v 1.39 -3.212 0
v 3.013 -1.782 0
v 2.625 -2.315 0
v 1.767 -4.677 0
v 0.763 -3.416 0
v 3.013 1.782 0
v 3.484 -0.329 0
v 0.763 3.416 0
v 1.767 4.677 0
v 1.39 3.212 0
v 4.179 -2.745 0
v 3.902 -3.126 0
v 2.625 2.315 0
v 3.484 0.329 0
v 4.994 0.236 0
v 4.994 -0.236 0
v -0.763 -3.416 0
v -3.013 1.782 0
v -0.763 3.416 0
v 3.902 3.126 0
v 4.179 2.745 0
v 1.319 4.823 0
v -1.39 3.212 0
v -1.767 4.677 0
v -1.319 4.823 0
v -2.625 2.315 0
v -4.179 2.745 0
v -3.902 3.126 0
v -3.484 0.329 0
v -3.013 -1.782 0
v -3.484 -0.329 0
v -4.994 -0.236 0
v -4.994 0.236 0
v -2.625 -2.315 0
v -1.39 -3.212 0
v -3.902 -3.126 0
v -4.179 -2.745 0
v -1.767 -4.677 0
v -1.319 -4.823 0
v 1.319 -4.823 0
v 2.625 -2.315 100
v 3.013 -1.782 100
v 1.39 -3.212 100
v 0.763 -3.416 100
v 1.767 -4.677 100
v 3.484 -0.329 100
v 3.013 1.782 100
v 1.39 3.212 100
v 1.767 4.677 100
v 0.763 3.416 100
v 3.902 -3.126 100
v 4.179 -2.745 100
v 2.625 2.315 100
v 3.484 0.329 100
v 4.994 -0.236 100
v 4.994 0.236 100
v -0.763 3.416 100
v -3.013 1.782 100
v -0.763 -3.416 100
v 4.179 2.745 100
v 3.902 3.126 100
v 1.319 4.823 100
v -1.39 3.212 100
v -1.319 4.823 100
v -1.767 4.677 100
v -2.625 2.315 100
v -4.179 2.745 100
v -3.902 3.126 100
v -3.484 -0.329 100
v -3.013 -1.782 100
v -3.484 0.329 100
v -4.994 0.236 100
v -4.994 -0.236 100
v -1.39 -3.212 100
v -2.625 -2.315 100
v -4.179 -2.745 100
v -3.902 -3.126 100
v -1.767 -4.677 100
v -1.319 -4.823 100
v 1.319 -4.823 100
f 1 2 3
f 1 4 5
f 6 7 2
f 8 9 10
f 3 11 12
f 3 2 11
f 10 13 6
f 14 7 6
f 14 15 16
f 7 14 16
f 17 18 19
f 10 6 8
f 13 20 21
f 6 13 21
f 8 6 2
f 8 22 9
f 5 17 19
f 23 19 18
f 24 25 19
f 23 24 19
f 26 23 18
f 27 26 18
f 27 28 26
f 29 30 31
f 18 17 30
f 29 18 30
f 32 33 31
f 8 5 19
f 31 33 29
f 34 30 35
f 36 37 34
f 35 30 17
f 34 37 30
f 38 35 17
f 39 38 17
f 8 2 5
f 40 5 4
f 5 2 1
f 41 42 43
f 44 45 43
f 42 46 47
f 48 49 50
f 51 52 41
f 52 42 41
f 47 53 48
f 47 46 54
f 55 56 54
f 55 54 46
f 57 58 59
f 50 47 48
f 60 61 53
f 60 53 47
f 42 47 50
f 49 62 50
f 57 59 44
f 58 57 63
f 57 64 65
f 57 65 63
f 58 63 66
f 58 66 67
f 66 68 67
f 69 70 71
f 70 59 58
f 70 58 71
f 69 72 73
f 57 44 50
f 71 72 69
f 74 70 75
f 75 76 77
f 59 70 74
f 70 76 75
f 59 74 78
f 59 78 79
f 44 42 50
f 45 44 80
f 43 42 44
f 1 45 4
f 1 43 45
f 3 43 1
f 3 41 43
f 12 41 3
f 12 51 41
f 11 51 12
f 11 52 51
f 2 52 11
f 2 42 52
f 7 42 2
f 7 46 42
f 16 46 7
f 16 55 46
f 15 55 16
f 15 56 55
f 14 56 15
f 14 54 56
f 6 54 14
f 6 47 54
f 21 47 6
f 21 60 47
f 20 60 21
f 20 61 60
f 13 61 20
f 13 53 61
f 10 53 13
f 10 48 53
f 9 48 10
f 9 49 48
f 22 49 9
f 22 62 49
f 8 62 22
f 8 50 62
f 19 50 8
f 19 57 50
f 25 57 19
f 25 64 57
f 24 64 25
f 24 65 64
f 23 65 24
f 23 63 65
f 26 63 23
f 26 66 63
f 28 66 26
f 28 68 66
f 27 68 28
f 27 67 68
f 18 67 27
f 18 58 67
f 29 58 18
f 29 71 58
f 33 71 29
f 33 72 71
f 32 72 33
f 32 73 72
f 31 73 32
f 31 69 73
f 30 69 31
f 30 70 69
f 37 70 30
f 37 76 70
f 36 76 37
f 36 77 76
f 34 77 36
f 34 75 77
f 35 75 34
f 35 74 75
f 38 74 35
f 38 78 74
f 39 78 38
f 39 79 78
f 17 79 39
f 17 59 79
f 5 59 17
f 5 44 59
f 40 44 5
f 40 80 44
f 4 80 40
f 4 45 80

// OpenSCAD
// --- Parameters ---
rod_height = 100;      // How tall the rod is
number_of_teeth = 10;  // Fewer teeth = smaller diameter
outer_radius = 5;      // Distance from center to tooth tip
inner_radius = 3.5;    // Distance from center to tooth valley
tooth_width = 0.6;     // Sharpness of the teeth (0.1 to 1.0)

// --- The Logic ---
linear_extrude(height = rod_height, convexity = 10) {
    gear_profile(number_of_teeth, outer_radius, inner_radius, tooth_width);
}

// Module to create the 2D gear shape
module gear_profile(teeth, r_out, r_in, flat) {
    angle_step = 360 / teeth;
    
    points = [
        for (i = [0 : teeth - 1]) 
            each [
                // Inner point (start of tooth)
                [r_in * cos(i * angle_step - angle_step * flat/4), 
                 r_in * sin(i * angle_step - angle_step * flat/4)],
                
                // Outer point 1 (tip start)
                [r_out * cos(i * angle_step - angle_step * flat/8), 
                 r_out * sin(i * angle_step - angle_step * flat/8)],
                
                // Outer point 2 (tip end)
                [r_out * cos(i * angle_step + angle_step * flat/8), 
                 r_out * sin(i * angle_step + angle_step * flat/8)],
                
                // Inner point (end of tooth)
                [r_in * cos(i * angle_step + angle_step * flat/4), 
                 r_in * sin(i * angle_step + angle_step * flat/4)]
            ]
    ];
    
    polygon(points);
}
